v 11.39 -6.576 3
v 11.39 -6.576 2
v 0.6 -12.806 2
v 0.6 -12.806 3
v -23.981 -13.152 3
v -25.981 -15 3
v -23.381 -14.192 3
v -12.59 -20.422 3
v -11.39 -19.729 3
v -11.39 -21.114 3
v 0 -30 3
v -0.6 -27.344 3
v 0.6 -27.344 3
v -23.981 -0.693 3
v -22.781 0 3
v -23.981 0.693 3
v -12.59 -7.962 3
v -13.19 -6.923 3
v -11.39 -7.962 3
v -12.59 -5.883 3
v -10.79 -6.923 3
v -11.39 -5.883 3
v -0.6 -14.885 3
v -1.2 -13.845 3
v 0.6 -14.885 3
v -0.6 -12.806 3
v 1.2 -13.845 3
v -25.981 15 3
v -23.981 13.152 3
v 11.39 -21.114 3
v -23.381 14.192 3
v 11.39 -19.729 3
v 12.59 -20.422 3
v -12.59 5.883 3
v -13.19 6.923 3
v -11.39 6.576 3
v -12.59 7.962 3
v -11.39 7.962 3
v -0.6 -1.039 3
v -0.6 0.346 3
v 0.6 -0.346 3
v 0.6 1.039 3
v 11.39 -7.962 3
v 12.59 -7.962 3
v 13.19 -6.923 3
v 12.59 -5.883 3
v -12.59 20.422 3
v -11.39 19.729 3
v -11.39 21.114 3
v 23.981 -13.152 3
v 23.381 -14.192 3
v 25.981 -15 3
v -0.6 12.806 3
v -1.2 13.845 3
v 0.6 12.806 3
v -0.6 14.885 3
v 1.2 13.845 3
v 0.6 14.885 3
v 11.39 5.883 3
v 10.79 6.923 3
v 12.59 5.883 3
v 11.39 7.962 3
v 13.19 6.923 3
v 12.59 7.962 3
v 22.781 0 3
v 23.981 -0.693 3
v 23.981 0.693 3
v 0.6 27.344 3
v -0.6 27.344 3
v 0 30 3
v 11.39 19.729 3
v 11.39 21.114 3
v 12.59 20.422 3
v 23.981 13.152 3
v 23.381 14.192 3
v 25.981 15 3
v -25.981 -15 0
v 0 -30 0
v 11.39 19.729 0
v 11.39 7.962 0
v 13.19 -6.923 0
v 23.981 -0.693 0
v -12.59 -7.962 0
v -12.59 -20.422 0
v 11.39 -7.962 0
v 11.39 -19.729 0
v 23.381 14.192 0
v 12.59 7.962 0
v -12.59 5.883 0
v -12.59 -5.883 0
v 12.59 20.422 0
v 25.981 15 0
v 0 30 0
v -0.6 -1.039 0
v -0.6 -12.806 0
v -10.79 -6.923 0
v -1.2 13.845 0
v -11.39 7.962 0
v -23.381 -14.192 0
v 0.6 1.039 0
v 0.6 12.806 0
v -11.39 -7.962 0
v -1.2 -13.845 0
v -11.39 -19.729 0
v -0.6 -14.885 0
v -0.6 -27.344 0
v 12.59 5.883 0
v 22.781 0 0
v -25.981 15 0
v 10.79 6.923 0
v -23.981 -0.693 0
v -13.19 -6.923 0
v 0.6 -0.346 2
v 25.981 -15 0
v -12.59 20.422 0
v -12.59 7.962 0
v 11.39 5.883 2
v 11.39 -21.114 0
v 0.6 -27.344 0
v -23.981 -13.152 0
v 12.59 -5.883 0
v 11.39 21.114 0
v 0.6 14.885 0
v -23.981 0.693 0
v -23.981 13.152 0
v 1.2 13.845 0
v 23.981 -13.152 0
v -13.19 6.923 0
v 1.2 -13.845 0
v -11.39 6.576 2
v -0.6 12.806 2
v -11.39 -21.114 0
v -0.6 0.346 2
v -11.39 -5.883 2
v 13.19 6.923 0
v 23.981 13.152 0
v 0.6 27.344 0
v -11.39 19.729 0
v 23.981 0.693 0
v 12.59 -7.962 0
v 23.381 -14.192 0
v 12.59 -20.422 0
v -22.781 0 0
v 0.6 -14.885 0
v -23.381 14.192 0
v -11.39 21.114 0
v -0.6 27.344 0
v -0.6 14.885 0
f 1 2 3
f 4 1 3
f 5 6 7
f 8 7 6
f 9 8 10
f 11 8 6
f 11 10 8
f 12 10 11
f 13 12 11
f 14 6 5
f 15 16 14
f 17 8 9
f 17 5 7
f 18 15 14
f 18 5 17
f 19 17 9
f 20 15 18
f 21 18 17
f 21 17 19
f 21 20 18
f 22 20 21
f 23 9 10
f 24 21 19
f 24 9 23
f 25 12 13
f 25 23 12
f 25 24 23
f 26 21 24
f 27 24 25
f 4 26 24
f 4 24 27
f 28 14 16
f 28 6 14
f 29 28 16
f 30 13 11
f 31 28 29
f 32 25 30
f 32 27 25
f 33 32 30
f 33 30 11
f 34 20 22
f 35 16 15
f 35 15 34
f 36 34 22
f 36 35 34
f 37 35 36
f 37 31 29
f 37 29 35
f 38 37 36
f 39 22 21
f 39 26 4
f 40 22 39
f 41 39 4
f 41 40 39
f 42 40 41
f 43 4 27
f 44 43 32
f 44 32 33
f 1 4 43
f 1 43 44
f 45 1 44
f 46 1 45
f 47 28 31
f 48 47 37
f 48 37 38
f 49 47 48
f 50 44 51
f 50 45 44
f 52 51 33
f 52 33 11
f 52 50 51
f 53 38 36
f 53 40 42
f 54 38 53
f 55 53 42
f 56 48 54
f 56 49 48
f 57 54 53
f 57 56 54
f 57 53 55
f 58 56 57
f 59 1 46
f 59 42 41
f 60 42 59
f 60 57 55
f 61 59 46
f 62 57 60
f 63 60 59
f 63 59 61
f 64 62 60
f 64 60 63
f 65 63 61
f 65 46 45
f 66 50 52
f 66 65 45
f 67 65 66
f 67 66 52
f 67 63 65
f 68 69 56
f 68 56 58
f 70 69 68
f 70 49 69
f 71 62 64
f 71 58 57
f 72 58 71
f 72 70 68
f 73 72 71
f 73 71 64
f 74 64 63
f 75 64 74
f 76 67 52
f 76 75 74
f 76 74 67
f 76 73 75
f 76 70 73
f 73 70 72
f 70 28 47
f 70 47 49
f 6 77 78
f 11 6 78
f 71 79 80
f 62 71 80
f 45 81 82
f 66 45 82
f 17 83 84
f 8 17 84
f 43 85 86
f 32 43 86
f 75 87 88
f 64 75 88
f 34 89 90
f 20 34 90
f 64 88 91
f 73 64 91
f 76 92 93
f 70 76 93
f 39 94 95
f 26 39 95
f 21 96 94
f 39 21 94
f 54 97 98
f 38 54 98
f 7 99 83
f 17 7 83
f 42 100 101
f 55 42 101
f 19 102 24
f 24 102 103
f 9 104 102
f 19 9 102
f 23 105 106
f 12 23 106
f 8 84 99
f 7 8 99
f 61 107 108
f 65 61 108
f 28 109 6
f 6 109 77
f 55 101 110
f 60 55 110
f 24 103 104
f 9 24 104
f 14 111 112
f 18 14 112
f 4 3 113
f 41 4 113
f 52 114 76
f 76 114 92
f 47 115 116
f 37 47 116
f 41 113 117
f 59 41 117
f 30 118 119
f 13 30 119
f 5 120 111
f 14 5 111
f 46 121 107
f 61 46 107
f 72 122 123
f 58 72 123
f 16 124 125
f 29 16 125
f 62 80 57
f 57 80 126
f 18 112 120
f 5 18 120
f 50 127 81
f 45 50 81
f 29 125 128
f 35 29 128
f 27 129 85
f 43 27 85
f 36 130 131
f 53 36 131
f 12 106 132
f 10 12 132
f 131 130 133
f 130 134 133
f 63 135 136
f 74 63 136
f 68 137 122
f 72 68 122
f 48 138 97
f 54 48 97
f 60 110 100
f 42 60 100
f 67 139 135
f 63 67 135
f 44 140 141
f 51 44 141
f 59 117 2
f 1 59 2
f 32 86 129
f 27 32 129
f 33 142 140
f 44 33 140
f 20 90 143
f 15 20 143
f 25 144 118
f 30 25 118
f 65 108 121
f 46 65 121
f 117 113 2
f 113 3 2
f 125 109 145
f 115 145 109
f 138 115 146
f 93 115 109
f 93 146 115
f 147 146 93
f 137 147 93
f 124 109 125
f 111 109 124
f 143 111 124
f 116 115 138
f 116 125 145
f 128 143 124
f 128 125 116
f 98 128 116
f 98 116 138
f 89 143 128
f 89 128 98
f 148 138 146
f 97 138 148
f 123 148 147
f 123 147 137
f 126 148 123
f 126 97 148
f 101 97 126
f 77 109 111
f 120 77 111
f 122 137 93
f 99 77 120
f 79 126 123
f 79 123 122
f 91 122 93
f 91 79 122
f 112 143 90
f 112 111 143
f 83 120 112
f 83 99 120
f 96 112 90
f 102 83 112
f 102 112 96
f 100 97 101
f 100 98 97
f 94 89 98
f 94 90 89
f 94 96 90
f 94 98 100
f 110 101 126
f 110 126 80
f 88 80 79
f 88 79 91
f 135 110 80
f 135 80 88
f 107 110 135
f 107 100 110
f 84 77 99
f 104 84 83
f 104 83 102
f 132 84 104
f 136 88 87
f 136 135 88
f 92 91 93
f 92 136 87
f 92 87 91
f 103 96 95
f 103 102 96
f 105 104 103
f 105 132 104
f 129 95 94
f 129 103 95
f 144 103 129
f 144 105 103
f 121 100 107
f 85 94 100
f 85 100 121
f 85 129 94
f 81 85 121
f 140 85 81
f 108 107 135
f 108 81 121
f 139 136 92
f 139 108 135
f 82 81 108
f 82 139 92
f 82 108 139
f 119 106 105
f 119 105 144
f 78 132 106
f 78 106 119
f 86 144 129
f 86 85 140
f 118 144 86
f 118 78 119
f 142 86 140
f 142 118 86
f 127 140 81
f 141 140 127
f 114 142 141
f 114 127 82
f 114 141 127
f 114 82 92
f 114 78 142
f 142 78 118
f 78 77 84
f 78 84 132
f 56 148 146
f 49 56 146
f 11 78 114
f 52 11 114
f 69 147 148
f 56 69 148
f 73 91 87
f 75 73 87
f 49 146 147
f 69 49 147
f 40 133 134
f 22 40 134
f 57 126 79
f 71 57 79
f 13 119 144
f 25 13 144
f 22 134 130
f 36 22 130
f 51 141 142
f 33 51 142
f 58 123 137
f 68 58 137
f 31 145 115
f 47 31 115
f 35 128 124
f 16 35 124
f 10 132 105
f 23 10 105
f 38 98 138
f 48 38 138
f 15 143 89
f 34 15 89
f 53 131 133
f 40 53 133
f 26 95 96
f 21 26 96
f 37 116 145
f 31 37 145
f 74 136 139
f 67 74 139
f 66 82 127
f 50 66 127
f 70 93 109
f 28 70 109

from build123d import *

# Parameters (mm, degrees)
F1_DEPTH = 3
F3_DEPTH = 2


with BuildPart() as f1:
    # F0 (on Top) → F1 (new body)
    with BuildSketch(Plane.XY):
        Polygon((25.980762, 15), (0, 30), (-25.980762, 15), (-25.980762, -15), (0, -30), (25.980762, -15), align=None)
        Polygon((-0.6, -14.88453), (-0.6, -27.344189), (-11.390381, -21.114359), align=None, mode=Mode.SUBTRACT)
        Polygon((-12.590381, -7.96188), (-12.590381, -20.421539), (-23.380762, -14.19171), align=None, mode=Mode.SUBTRACT)
        Polygon((-13.190381, -6.92265), (-23.980762, -13.152479), (-23.980762, -0.69282), align=None, mode=Mode.SUBTRACT)
        Polygon((-12.590381, -5.883419), (-22.780762, 0), (-12.590381, 5.883419), align=None, mode=Mode.SUBTRACT)
        Polygon((-1.2, -13.845299), (-11.390381, -19.728719), (-11.390381, -7.96188), align=None, mode=Mode.SUBTRACT)
        Polygon((-0.6, -1.03923), (-0.6, -12.806069), (-10.790381, -6.92265), align=None, mode=Mode.SUBTRACT)
        Polygon((0.6, -14.88453), (11.390381, -21.114359), (0.6, -27.344189), align=None, mode=Mode.SUBTRACT)
        Polygon((11.390381, -7.96188), (11.390381, -19.728719), (1.2, -13.845299), align=None, mode=Mode.SUBTRACT)
        Polygon((0.6, -12.806069), (0.6, -0.34641), (11.390381, 5.883419), (11.390381, -6.57624), align=None, mode=Mode.SUBTRACT)
        Polygon((12.590381, -7.96188), (23.380762, -14.19171), (12.590381, -20.421539), align=None, mode=Mode.SUBTRACT)
        Polygon((13.190381, -6.92265), (23.980762, -0.69282), (23.980762, -13.152479), align=None, mode=Mode.SUBTRACT)
        Polygon((-13.190381, 6.92265), (-23.980762, 0.69282), (-23.980762, 13.152479), align=None, mode=Mode.SUBTRACT)
        Polygon((-12.590381, 7.96188), (-23.380762, 14.19171), (-12.590381, 20.421539), align=None, mode=Mode.SUBTRACT)
        Polygon((-0.6, 12.806069), (-0.6, 0.34641), (-11.390381, -5.883419), (-11.390381, 6.57624), align=None, mode=Mode.SUBTRACT)
        Polygon((-11.390381, 19.728719), (-1.2, 13.845299), (-11.390381, 7.96188), align=None, mode=Mode.SUBTRACT)
        Polygon((-0.6, 14.88453), (-11.390381, 21.114359), (-0.6, 27.344189), align=None, mode=Mode.SUBTRACT)
        Polygon((0.6, 12.806069), (10.790381, 6.92265), (0.6, 1.03923), align=None, mode=Mode.SUBTRACT)
        Polygon((11.390381, 19.728719), (11.390381, 7.96188), (1.2, 13.845299), align=None, mode=Mode.SUBTRACT)
        Polygon((12.590381, 5.883419), (22.780762, 0), (12.590381, -5.883419), align=None, mode=Mode.SUBTRACT)
        Polygon((13.190381, 6.92265), (23.980762, 13.152479), (23.980762, 0.69282), align=None, mode=Mode.SUBTRACT)
        Polygon((12.590381, 7.96188), (12.590381, 20.421539), (23.380762, 14.19171), align=None, mode=Mode.SUBTRACT)
        Polygon((0.6, 14.88453), (0.6, 27.344189), (11.390381, 21.114359), align=None, mode=Mode.SUBTRACT)
    extrude(amount=F1_DEPTH)

    # F2 (on face) → F3 (join)
    with BuildSketch(Plane(origin=(0, 0, 0), x_dir=(1, 0, 0), z_dir=(0, 0, -1))):
        Polygon((-11.390381, -6.57624), (-0.6, -12.806069), (-0.6, -0.34641), (-11.390381, 5.883419), align=None)
        Polygon((0.6, 0.34641), (11.390381, -5.883419), (11.390381, 6.57624), (0.6, 12.806069), align=None)
    extrude(amount=-F3_DEPTH)


solid = f1.part
